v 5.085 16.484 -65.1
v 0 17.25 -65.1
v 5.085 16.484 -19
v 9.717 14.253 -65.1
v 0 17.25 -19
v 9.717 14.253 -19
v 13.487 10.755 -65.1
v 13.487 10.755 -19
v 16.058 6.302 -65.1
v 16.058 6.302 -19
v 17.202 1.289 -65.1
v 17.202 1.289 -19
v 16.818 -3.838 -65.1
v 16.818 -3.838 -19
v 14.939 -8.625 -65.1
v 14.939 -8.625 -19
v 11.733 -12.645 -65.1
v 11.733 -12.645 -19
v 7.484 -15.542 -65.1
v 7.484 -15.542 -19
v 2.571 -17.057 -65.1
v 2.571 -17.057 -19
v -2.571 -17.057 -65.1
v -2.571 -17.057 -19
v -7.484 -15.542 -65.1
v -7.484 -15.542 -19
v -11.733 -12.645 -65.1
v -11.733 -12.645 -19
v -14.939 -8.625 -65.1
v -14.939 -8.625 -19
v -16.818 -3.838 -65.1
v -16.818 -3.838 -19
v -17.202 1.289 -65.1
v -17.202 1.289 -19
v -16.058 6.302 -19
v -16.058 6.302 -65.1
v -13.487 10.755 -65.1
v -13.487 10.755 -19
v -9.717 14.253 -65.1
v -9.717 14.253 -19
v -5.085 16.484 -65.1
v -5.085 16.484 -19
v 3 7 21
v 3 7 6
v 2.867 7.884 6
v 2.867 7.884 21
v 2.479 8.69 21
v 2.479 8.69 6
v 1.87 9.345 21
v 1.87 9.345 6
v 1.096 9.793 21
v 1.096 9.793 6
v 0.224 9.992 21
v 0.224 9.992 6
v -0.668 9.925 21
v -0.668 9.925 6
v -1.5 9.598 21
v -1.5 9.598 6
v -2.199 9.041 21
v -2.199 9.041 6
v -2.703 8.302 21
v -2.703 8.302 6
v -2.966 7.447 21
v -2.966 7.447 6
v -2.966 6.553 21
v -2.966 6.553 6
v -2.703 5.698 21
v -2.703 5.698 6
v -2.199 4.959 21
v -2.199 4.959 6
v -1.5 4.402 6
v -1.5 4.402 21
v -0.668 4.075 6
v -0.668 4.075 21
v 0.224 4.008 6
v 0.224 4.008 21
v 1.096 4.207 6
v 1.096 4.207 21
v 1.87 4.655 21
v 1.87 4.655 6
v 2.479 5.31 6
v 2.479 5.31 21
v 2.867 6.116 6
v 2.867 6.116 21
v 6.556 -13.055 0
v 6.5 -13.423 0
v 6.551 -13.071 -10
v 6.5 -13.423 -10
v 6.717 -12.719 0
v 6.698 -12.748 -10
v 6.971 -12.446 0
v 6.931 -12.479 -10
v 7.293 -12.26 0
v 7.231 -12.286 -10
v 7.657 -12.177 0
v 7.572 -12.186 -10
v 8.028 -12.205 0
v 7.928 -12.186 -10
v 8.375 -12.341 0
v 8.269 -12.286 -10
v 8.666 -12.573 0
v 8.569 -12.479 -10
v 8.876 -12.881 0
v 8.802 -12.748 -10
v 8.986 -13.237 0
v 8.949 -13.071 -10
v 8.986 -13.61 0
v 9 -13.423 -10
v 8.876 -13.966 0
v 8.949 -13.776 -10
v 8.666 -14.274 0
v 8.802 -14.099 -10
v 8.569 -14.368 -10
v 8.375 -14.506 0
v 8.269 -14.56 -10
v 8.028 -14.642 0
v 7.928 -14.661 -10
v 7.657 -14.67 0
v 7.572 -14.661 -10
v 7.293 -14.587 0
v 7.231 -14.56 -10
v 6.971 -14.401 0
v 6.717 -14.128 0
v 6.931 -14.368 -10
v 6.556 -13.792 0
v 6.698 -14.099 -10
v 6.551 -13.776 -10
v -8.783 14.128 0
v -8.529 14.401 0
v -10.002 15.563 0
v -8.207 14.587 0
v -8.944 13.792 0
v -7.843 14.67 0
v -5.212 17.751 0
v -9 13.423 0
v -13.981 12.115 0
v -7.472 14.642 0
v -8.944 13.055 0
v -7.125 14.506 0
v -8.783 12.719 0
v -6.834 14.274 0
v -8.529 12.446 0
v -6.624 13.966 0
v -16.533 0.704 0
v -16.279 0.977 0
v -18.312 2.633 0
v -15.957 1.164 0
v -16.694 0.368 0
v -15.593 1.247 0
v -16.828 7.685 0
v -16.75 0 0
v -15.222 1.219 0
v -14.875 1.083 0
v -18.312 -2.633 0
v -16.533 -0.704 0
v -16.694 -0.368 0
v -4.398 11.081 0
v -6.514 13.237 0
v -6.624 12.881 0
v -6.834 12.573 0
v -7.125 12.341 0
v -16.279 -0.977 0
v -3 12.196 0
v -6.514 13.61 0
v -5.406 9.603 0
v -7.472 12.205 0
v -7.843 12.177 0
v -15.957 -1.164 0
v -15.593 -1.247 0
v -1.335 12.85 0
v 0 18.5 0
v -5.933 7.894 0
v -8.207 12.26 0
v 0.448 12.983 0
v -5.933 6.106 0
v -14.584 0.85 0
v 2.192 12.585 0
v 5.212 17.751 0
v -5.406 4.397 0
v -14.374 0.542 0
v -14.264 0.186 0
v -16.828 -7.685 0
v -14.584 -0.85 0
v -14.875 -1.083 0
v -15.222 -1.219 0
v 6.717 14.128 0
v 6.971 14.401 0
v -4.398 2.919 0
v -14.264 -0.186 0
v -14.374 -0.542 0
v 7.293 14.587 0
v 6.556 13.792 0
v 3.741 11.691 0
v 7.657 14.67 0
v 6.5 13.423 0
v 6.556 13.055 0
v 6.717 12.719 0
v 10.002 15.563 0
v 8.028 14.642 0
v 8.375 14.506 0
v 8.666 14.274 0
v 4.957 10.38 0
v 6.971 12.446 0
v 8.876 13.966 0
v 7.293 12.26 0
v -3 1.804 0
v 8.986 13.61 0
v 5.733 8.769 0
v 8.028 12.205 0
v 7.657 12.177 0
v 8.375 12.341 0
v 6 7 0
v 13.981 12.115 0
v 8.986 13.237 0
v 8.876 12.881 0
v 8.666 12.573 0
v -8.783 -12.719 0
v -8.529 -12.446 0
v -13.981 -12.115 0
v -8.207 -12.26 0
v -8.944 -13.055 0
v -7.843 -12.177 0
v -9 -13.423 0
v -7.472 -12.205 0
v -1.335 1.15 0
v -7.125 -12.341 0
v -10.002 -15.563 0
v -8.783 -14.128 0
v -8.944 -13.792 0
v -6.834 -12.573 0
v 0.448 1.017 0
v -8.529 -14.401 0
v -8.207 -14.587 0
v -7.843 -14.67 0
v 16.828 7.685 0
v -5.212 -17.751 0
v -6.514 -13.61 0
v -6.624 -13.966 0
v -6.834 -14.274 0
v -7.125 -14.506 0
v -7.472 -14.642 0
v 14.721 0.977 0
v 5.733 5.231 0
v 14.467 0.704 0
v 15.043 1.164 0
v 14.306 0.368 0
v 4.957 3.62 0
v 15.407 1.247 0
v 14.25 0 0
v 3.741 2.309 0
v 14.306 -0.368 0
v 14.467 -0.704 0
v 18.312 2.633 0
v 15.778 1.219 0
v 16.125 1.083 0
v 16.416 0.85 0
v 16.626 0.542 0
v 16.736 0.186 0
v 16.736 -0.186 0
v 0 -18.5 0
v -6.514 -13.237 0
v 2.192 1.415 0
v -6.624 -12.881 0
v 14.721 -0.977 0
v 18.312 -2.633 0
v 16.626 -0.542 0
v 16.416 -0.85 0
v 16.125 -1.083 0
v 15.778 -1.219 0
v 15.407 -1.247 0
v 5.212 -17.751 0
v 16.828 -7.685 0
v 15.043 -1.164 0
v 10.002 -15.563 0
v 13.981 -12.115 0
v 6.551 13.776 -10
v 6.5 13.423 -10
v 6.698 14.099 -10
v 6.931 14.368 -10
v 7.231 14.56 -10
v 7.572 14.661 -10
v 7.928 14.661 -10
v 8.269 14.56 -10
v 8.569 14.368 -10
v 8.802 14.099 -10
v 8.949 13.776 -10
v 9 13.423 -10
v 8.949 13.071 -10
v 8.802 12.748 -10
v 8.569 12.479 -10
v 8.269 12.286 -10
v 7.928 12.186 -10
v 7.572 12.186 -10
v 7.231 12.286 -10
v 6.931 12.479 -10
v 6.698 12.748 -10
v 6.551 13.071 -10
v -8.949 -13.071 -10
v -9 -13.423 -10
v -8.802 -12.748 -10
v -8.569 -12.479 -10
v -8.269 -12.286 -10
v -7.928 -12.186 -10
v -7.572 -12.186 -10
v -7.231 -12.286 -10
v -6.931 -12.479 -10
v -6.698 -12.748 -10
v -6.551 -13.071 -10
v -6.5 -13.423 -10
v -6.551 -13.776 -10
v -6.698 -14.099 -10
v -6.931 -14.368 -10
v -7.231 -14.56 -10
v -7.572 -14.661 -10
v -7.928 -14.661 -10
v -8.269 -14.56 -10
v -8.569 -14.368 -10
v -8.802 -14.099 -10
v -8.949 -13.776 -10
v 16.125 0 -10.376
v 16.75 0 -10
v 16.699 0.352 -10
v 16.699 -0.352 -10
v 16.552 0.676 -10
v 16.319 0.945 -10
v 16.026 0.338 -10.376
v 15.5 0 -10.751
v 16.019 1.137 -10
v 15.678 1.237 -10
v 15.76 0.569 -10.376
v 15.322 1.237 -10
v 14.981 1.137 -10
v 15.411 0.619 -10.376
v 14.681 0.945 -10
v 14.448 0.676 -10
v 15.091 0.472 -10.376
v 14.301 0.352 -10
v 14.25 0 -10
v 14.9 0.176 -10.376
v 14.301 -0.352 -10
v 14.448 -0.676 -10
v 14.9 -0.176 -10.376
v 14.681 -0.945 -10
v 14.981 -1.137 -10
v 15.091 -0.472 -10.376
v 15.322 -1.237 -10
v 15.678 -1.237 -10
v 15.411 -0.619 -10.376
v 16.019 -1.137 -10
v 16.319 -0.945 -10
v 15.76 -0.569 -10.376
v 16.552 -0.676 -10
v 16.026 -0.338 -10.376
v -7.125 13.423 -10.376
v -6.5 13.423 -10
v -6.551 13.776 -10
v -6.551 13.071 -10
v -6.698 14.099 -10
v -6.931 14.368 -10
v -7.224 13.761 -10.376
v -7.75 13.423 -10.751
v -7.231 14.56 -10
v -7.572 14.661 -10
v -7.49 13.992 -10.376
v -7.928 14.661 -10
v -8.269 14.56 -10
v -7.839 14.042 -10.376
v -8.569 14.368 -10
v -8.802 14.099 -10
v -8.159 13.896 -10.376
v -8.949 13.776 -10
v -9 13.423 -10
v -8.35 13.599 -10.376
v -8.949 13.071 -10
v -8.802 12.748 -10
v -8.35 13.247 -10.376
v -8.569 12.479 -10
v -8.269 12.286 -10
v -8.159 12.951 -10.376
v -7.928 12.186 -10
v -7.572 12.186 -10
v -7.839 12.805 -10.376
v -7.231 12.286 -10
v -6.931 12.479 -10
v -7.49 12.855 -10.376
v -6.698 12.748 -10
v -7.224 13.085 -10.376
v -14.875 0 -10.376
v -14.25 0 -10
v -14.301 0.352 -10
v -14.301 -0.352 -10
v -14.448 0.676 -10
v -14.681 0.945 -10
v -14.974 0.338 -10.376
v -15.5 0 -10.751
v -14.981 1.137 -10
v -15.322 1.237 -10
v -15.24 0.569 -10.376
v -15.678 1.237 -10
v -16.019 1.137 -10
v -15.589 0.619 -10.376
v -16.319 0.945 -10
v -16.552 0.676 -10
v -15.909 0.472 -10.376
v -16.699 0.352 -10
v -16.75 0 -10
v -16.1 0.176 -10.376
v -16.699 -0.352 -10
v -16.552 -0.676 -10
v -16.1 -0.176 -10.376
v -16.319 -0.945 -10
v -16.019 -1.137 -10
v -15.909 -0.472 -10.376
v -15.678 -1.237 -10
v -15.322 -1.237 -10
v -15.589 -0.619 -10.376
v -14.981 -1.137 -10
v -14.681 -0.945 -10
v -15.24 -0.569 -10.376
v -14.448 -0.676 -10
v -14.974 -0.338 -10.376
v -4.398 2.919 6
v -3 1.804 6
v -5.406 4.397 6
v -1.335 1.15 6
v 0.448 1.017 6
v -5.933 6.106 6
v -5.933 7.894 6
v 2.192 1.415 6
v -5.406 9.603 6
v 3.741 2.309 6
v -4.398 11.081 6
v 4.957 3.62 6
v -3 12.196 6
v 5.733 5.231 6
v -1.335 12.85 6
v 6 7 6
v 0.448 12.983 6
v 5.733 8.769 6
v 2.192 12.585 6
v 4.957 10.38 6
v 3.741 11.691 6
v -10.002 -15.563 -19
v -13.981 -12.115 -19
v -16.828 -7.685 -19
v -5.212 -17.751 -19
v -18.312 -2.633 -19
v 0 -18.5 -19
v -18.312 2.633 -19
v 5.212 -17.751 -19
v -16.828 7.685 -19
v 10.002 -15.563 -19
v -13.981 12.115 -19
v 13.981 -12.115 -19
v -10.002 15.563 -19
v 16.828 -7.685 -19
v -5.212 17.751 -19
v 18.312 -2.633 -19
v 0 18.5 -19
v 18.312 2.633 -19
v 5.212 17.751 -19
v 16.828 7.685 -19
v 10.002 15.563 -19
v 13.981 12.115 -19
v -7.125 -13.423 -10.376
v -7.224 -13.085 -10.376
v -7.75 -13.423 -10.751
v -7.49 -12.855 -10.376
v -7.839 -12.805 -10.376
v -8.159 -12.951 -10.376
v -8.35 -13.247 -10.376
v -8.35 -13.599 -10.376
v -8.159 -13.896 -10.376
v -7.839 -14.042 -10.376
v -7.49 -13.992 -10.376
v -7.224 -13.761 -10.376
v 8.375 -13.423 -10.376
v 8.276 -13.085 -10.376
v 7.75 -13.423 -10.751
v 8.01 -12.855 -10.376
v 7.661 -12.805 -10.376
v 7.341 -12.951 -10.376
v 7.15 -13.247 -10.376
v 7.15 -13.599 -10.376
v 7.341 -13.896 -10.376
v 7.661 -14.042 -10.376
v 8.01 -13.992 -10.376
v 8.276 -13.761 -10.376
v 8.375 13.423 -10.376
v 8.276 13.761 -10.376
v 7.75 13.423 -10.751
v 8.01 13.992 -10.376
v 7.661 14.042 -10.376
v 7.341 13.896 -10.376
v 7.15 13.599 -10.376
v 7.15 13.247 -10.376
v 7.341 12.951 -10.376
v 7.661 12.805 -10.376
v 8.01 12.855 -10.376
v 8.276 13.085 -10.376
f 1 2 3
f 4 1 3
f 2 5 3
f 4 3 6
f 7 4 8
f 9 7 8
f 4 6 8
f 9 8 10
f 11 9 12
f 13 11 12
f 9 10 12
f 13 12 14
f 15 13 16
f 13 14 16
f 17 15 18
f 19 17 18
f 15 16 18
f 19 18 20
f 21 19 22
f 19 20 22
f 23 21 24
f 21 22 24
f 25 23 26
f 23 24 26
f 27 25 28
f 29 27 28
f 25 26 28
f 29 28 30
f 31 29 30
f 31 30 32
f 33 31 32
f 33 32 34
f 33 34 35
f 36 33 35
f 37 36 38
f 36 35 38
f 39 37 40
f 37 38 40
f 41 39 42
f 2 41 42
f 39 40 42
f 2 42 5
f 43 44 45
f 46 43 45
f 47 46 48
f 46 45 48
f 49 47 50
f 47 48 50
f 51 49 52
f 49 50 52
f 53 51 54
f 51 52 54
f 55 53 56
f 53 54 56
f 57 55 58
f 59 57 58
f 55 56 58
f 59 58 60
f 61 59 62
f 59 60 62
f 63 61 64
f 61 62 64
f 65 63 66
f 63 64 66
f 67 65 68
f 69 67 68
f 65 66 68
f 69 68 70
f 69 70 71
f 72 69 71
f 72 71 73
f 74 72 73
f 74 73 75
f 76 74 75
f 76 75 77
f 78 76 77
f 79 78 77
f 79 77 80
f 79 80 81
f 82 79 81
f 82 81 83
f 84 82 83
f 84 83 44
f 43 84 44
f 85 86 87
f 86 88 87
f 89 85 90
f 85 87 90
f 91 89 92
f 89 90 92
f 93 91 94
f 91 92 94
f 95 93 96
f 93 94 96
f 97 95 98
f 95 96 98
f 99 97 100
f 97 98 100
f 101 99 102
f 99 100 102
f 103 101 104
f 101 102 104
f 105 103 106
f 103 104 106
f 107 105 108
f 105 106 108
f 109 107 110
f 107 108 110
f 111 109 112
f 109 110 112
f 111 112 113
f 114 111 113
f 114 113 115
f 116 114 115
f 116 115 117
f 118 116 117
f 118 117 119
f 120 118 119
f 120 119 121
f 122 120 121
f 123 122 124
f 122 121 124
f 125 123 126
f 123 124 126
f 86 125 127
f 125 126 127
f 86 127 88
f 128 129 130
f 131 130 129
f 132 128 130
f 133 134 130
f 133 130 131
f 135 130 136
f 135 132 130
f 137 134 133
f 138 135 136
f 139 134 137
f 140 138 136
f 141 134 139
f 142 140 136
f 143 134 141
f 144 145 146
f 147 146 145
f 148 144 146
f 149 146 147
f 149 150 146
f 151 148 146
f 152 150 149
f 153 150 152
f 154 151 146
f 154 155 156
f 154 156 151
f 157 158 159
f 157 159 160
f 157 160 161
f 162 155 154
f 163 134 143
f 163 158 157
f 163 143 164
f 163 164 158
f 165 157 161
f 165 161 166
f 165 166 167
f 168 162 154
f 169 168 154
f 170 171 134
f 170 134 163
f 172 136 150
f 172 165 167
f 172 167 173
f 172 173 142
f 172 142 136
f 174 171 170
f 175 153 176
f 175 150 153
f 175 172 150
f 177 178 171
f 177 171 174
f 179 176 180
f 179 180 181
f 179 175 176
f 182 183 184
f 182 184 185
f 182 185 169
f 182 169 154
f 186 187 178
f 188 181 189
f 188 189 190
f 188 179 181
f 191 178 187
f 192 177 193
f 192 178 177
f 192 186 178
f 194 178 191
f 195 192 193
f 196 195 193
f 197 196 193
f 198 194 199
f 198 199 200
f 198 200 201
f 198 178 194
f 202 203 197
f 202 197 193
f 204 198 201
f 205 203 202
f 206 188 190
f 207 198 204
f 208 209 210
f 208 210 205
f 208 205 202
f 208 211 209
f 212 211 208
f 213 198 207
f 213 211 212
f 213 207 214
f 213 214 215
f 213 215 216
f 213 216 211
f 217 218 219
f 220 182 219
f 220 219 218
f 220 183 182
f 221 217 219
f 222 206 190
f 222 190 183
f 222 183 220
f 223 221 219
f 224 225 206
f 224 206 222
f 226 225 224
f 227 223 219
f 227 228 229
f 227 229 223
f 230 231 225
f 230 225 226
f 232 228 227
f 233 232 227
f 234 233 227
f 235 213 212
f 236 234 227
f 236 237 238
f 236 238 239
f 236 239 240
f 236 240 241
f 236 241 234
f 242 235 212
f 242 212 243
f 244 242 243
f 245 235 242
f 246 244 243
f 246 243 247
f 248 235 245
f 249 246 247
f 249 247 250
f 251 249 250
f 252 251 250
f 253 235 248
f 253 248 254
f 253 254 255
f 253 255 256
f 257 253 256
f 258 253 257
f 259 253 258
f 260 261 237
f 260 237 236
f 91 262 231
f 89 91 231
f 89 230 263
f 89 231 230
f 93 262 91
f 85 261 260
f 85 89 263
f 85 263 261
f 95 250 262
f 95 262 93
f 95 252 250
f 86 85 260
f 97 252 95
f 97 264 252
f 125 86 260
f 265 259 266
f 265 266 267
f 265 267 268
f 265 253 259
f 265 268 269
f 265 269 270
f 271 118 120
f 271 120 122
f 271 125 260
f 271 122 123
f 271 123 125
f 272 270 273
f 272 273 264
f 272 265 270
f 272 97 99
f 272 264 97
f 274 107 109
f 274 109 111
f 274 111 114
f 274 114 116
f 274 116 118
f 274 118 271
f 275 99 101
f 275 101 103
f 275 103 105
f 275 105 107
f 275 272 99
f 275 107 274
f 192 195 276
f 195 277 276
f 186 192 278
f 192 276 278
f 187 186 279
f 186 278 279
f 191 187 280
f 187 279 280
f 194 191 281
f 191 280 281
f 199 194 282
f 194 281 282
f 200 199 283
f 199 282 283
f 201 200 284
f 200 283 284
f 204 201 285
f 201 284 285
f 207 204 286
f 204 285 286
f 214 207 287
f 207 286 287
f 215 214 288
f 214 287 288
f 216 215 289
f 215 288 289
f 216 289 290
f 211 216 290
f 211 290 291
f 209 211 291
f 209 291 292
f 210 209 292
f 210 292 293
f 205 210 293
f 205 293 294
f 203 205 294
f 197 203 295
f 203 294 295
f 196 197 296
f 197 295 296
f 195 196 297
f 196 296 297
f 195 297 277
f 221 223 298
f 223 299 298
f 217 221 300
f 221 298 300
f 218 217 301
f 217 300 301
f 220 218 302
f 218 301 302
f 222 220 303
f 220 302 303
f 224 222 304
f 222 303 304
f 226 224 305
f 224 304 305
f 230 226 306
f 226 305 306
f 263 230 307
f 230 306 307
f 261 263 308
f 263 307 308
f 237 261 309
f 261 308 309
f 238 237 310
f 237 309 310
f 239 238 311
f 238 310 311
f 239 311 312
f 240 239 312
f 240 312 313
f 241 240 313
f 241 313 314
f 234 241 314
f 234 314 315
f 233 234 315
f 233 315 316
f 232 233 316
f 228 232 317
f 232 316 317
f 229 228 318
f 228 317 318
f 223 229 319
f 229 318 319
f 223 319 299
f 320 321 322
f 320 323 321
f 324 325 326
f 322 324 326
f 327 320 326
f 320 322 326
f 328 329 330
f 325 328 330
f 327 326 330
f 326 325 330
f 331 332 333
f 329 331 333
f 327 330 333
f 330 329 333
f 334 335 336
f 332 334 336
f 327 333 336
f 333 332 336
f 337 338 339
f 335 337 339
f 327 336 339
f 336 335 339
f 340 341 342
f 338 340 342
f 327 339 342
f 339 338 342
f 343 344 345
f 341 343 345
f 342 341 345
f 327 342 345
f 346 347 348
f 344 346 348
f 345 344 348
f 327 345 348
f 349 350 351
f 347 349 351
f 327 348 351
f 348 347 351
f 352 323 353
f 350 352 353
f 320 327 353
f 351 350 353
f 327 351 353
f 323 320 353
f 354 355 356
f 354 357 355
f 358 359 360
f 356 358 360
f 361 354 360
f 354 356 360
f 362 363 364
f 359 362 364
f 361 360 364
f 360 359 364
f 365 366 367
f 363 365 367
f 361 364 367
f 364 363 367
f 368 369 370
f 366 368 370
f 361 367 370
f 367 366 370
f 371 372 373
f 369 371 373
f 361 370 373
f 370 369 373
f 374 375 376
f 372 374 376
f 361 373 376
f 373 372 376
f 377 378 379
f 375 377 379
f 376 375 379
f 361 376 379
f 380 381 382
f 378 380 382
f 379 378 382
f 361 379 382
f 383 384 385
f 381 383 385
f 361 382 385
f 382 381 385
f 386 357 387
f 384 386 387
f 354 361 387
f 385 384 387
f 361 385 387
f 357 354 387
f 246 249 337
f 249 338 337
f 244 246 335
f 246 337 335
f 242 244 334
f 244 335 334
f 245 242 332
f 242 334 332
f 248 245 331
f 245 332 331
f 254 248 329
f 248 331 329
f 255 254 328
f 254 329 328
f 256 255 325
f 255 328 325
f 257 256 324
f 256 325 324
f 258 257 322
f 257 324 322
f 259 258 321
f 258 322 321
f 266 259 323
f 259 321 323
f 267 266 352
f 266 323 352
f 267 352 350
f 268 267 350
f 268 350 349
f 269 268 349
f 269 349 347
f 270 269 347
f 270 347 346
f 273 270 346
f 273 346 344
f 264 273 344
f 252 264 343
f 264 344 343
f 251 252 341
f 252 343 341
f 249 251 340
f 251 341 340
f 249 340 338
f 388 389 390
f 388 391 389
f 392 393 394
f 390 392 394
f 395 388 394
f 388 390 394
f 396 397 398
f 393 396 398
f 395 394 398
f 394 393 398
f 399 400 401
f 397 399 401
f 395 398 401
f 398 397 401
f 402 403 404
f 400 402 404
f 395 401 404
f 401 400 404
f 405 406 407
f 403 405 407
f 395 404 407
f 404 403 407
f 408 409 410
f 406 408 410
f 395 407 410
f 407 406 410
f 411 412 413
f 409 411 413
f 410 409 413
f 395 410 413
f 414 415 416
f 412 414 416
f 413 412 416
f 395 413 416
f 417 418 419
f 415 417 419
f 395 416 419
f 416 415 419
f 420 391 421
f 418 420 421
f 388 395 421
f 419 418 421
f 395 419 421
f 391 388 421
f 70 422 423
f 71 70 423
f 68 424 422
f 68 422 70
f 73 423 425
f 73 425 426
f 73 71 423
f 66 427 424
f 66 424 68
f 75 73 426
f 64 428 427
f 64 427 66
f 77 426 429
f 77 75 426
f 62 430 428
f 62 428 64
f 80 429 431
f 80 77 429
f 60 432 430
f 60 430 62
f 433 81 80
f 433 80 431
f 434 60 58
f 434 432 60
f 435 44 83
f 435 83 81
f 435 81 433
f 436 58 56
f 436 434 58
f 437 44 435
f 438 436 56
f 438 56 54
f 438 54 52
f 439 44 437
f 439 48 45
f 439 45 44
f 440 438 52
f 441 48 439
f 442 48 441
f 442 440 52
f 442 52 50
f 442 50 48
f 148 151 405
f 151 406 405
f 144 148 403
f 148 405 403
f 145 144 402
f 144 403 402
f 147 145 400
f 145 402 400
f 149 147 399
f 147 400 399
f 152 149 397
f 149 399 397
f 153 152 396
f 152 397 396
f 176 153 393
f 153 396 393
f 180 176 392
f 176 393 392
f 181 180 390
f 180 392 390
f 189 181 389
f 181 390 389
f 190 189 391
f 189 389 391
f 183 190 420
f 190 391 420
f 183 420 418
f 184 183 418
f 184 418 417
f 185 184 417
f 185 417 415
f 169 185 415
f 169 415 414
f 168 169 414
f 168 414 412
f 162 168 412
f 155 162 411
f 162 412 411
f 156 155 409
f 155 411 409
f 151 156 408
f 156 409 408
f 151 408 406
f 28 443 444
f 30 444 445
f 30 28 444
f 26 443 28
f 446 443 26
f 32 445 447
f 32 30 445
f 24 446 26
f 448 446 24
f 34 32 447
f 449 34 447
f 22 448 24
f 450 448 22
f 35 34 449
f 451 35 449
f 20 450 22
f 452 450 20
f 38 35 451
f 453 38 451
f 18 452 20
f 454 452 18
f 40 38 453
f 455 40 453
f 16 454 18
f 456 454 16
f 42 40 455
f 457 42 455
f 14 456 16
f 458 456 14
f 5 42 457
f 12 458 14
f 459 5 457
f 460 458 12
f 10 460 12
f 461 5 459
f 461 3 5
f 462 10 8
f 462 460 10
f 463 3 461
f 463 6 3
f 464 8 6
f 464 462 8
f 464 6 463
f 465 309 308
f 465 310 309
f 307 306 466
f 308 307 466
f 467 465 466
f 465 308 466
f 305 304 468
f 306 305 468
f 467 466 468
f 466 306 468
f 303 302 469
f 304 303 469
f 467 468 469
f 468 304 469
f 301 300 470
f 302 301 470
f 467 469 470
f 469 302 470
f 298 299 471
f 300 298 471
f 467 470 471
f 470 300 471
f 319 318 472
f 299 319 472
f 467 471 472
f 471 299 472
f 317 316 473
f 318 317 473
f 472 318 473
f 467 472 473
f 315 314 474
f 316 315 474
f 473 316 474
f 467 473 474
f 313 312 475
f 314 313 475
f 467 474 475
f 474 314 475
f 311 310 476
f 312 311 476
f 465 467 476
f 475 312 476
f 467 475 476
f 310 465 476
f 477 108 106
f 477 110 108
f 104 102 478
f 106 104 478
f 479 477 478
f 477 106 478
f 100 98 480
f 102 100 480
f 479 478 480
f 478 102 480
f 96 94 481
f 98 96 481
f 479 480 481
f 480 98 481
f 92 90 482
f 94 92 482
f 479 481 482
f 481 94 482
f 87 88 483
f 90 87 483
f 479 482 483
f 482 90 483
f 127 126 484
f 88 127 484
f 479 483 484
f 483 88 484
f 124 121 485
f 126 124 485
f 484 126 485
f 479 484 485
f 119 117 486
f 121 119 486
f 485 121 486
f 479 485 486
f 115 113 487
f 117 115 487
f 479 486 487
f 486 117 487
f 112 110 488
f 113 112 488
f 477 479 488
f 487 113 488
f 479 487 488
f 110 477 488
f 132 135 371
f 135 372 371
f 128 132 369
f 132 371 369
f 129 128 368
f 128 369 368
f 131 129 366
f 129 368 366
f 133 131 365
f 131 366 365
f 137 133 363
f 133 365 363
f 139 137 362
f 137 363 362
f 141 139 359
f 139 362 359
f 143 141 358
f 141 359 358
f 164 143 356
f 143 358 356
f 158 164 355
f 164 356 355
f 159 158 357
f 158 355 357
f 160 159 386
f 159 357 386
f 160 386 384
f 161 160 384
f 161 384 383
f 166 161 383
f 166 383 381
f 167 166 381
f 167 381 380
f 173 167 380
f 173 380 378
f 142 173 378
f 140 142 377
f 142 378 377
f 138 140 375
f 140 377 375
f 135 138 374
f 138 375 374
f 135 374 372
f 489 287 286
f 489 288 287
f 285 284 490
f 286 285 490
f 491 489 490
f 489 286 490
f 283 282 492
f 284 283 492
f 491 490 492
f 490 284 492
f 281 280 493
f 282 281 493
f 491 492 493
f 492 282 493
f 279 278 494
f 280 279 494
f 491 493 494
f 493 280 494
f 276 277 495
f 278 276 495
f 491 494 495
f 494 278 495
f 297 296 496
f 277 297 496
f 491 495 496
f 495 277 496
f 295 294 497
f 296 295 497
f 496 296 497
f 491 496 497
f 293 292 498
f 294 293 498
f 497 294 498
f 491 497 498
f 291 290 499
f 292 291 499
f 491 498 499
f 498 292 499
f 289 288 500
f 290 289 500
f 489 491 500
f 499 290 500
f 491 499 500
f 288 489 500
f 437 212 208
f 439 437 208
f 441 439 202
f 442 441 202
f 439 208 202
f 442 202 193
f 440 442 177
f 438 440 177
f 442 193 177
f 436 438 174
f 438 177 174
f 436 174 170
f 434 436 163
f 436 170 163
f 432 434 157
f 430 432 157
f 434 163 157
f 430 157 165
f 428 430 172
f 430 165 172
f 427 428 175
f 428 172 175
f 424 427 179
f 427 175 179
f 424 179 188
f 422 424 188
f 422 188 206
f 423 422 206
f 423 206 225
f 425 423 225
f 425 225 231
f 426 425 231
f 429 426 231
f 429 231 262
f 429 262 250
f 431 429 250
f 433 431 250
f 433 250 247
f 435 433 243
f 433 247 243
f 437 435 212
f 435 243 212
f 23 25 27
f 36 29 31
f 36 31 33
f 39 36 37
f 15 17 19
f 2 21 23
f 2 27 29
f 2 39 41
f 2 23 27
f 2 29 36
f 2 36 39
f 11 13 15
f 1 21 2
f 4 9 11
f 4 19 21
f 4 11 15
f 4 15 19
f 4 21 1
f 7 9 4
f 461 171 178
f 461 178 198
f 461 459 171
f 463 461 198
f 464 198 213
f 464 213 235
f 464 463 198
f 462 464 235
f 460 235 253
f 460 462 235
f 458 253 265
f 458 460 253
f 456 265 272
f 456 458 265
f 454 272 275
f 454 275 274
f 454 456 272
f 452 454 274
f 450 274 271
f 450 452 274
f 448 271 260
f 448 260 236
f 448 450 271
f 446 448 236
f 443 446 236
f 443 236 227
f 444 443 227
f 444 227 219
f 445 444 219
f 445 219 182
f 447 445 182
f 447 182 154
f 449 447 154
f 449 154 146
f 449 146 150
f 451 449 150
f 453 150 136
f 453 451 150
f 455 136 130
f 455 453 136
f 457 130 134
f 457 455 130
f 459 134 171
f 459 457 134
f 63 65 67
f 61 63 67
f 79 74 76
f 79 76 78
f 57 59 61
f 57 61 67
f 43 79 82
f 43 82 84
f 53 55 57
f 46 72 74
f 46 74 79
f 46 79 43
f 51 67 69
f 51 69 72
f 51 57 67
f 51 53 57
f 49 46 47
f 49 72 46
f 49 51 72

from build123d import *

# Parameters (mm, degrees)
SKETCH4_R                       = 6
BOSS_EXTRUDE3_DEPTH             = 6
SKETCH4_3_R                     = 3
BOSS_EXTRUDE4_DEPTH             = 21
TAP_DRILL_FOR_M3X0_5_TAP1_D     = 2.5
TAP_DRILL_FOR_M3X0_5_TAP1_DEPTH = 10
TAP_DRILL_FOR_M3X0_5_TAP1_TIP   = 0.751075774


with BuildPart() as part:
    # Sketch3 → Revolve1 (revolve)
    with BuildSketch(Plane(origin=(0, 0, 0), x_dir=(0, 0, -1), z_dir=(1, 0, 0))):
        Polygon((0, 0), (0, 18.5), (19, 18.5), (19, 17.25), (49.8, 17.25), (65.1, 17.25), (65.1, 0), align=None)
    revolve(axis=Axis((0, 0, 4.918404278), (0, 0, -1)))

    # Sketch4 → Boss-Extrude3 (add)
    with BuildSketch(Plane.XY):
        with Locations((0, 7)):
            Circle(SKETCH4_R)
    extrude(amount=BOSS_EXTRUDE3_DEPTH)

    # Sketch4<3> → Boss-Extrude4 (add)
    with BuildSketch(Plane.XY):
        with Locations((0, 7)):
            Circle(SKETCH4_3_R)
    extrude(amount=BOSS_EXTRUDE4_DEPTH)

    # Tap Drill for M3x0.5 Tap1
    with Locations(Plane.XY):
        with Locations((-15.5, 0), (-7.75, 13.423393759), (7.75, 13.423393759), (15.5, 0), (7.75, -13.423393759), (-7.75, -13.423393759)):
            Hole(TAP_DRILL_FOR_M3X0_5_TAP1_D / 2, depth=TAP_DRILL_FOR_M3X0_5_TAP1_DEPTH)
            with Locations((0, 0, -(TAP_DRILL_FOR_M3X0_5_TAP1_DEPTH + TAP_DRILL_FOR_M3X0_5_TAP1_TIP / 2))):  # 118° drill point
                Cone(0, TAP_DRILL_FOR_M3X0_5_TAP1_D / 2, TAP_DRILL_FOR_M3X0_5_TAP1_TIP, mode=Mode.SUBTRACT)


solid = part.part
